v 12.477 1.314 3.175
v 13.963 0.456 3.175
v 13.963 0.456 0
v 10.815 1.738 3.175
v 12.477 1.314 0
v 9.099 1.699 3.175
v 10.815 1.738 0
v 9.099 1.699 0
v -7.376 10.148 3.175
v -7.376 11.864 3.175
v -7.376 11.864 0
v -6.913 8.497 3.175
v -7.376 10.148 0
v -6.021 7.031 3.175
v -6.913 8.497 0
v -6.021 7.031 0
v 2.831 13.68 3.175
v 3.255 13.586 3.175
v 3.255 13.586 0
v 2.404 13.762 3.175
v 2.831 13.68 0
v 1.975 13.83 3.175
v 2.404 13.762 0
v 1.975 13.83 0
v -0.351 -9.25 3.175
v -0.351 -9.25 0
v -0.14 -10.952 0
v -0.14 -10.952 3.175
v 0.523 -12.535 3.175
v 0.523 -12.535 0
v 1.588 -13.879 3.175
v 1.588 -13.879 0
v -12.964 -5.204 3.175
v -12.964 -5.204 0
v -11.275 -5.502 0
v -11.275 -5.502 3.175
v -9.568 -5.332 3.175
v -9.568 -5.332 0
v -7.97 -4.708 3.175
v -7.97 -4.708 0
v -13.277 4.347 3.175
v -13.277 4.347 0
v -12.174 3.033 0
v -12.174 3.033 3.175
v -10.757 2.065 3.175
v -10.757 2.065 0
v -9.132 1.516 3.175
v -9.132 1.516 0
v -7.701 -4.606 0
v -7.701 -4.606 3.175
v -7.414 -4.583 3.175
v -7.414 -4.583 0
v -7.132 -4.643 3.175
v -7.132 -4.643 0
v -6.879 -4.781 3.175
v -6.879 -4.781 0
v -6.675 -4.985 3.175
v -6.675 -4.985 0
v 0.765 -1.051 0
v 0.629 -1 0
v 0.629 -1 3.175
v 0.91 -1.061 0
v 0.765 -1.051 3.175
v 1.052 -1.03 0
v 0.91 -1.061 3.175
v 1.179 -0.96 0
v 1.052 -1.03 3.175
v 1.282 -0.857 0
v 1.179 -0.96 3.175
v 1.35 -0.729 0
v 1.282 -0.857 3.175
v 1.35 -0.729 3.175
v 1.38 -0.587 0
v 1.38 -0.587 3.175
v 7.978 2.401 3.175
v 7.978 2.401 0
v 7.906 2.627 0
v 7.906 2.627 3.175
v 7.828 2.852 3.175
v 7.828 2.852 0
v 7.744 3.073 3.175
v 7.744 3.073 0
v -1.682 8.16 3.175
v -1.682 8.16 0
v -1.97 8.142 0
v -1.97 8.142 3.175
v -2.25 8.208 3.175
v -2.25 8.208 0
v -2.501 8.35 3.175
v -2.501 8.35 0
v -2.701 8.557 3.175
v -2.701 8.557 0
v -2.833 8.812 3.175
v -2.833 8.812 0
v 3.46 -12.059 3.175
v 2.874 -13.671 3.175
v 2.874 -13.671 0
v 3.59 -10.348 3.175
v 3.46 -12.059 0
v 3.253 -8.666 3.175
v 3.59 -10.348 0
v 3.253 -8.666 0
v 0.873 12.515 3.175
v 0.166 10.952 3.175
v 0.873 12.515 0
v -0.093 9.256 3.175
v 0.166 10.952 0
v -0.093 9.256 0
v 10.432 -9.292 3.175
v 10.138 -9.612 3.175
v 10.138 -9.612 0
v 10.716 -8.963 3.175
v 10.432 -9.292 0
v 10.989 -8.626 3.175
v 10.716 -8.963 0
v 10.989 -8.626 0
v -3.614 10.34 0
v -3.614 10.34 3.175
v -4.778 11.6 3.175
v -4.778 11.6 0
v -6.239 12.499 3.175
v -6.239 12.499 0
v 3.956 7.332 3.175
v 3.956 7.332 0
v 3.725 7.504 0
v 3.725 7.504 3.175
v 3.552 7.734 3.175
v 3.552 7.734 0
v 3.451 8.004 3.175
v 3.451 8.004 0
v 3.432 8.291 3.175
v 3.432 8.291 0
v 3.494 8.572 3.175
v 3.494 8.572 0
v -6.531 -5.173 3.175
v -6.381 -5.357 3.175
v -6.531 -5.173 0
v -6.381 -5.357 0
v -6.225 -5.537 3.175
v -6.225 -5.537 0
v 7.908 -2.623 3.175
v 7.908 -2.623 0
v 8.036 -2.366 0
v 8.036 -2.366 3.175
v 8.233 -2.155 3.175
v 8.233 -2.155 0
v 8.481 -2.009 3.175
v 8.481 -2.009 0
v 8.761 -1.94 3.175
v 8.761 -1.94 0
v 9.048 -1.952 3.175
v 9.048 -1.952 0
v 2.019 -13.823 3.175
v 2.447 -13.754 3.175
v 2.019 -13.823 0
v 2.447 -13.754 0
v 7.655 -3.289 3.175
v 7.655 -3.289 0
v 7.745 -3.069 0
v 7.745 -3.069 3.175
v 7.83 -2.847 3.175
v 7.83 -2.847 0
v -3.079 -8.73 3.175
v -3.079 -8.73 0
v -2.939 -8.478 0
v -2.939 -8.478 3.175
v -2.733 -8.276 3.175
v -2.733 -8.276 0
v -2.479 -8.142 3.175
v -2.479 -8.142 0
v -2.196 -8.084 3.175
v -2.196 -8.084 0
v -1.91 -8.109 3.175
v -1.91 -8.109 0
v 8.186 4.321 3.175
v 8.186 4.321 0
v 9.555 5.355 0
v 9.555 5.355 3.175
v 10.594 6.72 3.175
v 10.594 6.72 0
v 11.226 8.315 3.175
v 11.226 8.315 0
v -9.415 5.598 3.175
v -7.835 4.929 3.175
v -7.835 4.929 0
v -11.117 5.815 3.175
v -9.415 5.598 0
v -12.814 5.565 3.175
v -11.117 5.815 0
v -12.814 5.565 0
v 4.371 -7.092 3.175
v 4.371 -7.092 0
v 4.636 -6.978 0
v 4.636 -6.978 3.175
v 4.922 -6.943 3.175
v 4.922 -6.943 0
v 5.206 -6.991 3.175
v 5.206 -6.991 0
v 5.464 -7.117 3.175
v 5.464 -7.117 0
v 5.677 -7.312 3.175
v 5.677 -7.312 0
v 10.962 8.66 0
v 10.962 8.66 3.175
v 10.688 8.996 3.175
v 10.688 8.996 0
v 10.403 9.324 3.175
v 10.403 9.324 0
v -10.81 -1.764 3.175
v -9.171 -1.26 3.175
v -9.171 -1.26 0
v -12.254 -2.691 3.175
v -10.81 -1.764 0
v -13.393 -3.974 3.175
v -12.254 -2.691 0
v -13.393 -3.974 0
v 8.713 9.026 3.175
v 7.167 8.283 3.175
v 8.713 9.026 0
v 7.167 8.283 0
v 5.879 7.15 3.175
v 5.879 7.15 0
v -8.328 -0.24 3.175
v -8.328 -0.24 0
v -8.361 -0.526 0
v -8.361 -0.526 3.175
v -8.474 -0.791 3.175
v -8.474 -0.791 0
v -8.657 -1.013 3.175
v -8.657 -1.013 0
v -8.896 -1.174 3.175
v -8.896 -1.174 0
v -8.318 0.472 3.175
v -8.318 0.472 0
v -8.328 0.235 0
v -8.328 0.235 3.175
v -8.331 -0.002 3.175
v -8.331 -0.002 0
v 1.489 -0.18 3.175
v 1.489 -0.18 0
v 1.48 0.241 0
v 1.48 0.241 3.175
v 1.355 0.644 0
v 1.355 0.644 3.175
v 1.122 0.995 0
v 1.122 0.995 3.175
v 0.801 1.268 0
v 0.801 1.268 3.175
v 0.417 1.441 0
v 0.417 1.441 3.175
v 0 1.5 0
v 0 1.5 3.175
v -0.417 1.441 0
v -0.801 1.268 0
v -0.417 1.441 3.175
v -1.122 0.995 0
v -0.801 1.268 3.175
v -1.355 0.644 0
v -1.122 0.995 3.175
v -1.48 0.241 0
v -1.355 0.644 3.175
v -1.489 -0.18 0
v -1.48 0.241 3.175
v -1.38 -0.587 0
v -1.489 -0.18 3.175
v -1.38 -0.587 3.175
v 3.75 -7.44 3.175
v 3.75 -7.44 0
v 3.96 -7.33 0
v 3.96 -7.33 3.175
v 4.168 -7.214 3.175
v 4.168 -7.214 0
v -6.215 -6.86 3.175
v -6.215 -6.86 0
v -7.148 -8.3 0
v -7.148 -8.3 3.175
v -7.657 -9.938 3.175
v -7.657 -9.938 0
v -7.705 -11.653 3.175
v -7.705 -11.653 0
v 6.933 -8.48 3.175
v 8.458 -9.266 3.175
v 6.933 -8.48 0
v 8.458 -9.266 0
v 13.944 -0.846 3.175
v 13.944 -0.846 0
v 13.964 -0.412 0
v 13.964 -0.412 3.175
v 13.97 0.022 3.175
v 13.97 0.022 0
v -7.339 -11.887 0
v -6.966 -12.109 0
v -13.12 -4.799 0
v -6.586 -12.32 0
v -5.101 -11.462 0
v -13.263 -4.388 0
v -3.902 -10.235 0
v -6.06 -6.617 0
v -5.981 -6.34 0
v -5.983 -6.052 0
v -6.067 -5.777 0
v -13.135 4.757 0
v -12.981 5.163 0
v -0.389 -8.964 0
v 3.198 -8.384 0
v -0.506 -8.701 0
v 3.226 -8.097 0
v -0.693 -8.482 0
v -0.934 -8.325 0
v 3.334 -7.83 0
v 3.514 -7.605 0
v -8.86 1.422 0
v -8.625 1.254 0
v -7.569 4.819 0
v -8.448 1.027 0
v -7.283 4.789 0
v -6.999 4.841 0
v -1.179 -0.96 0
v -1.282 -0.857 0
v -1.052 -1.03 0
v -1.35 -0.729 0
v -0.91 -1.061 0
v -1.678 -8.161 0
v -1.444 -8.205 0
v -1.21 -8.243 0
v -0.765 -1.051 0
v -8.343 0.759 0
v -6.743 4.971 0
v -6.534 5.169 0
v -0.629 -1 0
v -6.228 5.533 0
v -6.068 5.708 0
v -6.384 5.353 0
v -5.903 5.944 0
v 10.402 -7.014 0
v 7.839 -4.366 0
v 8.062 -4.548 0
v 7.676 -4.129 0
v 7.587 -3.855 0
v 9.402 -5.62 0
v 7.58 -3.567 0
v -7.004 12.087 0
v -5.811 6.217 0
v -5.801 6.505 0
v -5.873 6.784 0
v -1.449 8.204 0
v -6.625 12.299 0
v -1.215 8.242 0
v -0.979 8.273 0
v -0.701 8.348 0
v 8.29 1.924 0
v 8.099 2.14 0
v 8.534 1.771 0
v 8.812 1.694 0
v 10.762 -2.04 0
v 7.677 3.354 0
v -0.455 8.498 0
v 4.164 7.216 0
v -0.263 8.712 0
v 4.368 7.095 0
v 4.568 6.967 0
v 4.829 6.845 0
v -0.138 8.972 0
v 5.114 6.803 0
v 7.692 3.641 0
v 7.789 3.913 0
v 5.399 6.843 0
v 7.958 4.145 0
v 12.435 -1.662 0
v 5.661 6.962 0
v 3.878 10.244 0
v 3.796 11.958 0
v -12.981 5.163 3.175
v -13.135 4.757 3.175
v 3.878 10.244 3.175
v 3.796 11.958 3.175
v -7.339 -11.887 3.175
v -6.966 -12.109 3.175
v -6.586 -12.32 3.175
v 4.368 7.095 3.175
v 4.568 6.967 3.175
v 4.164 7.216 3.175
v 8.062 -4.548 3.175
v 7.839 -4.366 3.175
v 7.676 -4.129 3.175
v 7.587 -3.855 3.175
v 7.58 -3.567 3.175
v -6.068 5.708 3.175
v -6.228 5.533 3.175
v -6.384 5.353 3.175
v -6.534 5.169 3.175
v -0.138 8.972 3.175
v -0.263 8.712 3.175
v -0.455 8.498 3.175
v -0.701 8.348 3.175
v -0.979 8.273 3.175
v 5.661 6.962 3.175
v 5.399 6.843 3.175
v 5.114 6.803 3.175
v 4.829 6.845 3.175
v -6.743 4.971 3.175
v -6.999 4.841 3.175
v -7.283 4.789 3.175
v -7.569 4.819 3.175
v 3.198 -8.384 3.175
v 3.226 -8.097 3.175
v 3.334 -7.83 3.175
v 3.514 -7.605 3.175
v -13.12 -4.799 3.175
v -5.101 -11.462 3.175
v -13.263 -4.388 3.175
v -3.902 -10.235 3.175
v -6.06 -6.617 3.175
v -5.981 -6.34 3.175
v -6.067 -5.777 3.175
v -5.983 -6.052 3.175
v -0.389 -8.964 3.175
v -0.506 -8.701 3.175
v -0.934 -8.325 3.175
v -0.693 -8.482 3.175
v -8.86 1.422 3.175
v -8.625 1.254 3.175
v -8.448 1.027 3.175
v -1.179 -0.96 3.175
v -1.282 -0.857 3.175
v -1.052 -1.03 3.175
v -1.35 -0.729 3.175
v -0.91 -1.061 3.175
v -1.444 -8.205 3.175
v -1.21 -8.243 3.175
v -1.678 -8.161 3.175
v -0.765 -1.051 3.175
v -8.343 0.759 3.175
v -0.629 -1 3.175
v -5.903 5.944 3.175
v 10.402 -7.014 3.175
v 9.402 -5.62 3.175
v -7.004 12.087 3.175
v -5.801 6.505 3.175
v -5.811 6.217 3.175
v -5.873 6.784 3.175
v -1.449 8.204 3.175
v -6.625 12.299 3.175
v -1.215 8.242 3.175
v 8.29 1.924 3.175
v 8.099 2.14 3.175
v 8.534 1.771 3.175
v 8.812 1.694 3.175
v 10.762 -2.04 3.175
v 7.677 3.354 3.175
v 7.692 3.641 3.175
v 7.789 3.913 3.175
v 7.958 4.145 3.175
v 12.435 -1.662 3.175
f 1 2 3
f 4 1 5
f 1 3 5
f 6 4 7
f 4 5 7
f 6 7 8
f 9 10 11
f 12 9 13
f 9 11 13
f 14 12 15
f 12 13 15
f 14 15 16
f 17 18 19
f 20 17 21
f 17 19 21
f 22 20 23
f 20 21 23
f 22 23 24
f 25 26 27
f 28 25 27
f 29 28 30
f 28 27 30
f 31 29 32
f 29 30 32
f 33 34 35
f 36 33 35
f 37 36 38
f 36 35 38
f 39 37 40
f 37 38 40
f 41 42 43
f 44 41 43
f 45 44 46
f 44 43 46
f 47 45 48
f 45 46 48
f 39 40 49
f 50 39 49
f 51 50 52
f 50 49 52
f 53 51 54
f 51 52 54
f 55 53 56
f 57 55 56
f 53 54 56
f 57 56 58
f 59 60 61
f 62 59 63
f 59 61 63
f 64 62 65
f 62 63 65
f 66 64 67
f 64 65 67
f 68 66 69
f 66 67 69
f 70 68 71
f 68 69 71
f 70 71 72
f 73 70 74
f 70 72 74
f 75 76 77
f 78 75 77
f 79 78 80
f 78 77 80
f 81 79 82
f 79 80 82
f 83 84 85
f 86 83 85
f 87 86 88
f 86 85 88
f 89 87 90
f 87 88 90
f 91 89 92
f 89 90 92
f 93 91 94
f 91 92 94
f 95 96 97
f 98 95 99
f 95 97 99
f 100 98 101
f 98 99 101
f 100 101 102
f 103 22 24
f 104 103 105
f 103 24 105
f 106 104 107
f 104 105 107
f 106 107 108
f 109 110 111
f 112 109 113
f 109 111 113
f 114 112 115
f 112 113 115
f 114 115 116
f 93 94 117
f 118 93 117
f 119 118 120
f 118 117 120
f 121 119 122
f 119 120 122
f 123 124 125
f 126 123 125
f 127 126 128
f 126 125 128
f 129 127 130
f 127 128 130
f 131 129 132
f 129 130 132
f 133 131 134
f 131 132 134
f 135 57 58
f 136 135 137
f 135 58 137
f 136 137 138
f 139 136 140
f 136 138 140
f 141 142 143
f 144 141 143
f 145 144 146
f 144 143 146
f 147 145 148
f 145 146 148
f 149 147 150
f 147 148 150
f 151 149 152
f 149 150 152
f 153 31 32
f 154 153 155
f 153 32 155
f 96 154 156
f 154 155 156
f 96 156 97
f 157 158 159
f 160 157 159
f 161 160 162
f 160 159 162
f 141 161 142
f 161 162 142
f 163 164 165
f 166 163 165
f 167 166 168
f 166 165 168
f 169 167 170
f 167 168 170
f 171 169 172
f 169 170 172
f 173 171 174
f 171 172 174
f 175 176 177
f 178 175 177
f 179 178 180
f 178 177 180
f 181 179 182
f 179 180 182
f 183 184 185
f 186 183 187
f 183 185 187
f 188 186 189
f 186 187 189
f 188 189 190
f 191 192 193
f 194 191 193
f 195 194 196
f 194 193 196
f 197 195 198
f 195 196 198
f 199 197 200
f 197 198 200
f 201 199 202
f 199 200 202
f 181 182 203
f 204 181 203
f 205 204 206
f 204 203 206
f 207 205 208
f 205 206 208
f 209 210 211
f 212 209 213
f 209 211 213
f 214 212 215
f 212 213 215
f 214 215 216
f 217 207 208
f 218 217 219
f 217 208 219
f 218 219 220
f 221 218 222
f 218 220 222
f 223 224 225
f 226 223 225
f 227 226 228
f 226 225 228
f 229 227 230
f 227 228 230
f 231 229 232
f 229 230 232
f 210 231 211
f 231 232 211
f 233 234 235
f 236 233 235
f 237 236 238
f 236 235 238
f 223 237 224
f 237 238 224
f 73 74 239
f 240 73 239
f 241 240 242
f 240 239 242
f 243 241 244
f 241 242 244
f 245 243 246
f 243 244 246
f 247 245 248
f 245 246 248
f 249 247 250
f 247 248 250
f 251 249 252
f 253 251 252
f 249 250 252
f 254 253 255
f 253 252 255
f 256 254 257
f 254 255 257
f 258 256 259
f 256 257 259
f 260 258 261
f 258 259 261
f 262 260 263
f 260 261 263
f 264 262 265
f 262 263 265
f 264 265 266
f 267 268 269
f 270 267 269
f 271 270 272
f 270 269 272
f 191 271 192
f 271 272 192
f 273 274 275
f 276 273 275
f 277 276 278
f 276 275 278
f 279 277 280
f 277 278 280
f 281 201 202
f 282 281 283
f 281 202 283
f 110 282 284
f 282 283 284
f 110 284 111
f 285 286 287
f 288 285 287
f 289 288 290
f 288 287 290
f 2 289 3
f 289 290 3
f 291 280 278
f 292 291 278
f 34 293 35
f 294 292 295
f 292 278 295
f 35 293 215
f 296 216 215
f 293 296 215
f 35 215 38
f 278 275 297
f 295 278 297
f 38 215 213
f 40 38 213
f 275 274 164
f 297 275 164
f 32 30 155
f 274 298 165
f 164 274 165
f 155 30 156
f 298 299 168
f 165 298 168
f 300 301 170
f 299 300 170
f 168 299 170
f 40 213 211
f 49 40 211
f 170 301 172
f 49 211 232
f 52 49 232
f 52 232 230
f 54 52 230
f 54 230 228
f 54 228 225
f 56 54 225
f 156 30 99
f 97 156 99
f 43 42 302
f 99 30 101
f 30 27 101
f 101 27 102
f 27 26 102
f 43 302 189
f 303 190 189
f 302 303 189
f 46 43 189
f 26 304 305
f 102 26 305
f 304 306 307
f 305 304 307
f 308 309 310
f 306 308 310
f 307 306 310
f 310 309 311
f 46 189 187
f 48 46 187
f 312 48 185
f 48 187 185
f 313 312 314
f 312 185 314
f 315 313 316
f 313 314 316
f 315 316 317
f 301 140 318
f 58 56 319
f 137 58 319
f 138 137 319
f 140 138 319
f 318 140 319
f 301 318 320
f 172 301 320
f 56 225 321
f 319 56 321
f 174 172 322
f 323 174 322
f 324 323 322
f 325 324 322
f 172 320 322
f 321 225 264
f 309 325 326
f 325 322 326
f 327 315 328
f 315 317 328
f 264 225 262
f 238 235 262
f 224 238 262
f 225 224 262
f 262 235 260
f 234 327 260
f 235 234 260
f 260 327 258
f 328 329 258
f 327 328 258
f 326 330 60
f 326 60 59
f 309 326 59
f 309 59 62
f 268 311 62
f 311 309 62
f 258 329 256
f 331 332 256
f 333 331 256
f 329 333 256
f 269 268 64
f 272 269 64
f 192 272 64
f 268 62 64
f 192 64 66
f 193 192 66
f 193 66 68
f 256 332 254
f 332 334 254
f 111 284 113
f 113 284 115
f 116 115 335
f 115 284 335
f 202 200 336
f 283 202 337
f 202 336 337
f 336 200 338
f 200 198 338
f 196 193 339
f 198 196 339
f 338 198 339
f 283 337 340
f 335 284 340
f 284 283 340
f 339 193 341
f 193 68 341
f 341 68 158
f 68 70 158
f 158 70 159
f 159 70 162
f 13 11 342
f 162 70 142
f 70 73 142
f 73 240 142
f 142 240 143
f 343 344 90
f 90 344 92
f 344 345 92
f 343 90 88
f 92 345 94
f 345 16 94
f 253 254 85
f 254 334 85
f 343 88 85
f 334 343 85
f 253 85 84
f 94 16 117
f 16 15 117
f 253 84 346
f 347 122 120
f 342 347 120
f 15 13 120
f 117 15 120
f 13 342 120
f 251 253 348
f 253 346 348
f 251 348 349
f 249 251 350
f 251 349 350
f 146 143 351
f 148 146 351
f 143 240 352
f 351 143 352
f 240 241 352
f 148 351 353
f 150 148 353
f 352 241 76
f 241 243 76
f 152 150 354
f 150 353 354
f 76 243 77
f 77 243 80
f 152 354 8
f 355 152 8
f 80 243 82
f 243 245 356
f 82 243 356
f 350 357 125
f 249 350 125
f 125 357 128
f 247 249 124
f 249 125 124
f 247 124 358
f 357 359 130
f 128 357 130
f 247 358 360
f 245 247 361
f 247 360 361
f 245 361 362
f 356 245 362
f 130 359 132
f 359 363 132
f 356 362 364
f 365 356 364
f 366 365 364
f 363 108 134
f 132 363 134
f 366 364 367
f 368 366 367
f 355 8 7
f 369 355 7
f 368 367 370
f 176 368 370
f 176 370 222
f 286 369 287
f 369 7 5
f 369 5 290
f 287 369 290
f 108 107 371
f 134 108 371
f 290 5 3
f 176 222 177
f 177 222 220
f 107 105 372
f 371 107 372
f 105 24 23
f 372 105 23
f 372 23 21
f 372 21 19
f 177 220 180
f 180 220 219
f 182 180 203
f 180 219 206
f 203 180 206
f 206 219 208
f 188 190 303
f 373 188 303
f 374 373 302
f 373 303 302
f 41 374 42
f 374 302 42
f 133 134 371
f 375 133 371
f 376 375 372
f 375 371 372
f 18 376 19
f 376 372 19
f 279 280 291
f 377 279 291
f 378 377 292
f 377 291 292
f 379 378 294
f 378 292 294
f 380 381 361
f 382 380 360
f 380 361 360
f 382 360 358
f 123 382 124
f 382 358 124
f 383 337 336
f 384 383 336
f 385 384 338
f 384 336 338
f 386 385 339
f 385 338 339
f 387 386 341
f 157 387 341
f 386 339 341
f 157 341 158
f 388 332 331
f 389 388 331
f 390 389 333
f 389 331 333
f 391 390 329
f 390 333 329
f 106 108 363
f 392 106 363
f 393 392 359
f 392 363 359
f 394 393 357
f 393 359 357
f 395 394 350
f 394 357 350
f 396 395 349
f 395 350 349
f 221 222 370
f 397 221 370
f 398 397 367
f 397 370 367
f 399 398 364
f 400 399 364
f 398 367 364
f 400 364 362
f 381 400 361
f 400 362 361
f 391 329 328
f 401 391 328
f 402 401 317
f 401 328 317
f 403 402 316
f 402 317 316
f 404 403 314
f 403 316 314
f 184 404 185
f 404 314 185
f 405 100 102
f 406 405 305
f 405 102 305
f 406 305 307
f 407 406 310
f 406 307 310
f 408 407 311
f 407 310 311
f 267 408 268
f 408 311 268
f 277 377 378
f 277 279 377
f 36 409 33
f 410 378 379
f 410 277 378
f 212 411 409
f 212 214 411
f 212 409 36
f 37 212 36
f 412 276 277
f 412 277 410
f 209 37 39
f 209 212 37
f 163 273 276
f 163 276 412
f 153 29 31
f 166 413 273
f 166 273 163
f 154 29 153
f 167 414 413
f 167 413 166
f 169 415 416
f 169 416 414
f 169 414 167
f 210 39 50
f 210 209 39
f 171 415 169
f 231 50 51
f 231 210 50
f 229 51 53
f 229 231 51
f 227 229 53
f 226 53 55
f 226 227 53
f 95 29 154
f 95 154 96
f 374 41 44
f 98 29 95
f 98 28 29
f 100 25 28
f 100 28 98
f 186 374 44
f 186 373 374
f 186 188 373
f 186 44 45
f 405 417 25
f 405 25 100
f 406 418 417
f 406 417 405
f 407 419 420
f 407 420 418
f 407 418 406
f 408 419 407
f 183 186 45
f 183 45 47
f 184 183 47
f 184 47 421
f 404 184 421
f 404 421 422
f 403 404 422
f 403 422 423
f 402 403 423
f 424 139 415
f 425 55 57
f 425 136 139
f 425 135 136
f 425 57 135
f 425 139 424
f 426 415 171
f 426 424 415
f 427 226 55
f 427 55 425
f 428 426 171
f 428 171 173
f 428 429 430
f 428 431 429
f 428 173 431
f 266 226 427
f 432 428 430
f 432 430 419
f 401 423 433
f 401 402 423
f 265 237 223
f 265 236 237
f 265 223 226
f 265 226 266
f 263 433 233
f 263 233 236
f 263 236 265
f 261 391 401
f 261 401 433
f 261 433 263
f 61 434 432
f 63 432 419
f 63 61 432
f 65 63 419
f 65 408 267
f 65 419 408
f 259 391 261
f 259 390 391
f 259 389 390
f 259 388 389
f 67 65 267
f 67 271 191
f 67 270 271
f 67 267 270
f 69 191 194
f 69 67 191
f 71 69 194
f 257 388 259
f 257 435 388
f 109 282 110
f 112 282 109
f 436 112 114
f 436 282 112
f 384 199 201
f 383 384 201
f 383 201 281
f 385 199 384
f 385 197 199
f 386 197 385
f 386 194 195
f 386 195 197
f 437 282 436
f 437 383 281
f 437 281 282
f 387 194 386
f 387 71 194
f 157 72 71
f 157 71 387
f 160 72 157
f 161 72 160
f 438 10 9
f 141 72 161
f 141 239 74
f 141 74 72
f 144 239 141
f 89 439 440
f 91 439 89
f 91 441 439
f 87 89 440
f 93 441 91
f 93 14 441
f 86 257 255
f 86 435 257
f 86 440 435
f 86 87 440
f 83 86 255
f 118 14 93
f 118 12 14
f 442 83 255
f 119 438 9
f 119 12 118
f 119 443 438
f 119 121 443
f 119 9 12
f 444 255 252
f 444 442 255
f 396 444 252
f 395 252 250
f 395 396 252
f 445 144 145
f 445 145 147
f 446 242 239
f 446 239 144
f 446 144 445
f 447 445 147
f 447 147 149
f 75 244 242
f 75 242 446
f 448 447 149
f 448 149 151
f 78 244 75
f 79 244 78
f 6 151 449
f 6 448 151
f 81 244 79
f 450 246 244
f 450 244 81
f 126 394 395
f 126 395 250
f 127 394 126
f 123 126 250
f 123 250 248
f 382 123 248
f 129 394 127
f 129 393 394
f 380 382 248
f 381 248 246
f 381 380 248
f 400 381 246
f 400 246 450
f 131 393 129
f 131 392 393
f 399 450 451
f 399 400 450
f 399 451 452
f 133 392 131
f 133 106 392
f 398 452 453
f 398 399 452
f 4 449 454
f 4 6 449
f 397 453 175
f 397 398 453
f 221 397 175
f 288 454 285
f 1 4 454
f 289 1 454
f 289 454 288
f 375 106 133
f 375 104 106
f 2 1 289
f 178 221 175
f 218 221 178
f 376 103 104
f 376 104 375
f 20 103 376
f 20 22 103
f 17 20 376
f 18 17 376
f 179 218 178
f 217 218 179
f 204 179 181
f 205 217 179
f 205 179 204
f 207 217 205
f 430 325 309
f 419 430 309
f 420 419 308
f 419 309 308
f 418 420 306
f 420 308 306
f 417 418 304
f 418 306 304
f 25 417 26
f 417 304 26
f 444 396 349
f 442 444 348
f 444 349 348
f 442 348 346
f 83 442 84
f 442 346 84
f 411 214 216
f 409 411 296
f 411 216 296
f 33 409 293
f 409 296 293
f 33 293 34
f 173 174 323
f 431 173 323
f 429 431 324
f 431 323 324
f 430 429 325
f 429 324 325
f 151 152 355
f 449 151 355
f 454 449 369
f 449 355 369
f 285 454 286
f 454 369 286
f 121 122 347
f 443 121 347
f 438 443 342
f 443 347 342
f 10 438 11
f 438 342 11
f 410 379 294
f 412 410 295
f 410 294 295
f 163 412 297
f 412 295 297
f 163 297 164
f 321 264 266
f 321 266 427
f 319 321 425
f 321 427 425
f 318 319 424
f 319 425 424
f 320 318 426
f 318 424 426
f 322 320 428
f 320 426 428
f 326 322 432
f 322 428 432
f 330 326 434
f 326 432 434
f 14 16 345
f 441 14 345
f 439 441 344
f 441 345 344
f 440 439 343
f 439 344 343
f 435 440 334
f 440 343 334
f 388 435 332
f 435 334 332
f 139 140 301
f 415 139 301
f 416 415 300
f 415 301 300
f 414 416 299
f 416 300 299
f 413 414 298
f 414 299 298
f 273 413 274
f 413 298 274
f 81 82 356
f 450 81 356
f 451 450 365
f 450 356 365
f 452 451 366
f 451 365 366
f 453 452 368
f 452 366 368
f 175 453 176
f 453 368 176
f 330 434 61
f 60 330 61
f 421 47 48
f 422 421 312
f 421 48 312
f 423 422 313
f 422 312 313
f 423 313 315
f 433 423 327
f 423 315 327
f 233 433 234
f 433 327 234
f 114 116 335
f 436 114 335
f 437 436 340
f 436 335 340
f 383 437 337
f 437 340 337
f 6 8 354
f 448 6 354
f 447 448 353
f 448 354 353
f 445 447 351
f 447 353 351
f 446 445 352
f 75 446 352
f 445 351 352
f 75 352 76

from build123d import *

# Parameters (mm, degrees)
SKETCH3_R           = 13.97
GEARBODY_DEPTH      = 3.175
TOOTHCUT_DEPTH      = 4.175
CIRPATTERN1_COUNT   = 9
BOREDIA_R           = 1.499997014
BORE_DEPTH          = 12700
BOSS_EXTRUDE1_DEPTH = 3.175
SKETCH5_R           = 0.508
CUT_EXTRUDE1_DEPTH  = 4.175


with BuildPart() as part:
    # Sketch3 → gearBody (new body)
    with BuildSketch(Plane.XY):
        Circle(SKETCH3_R)
    extrude(amount=GEARBODY_DEPTH)

    # Sketch2 → toothCut (cut, through all)
    with BuildSketch(Plane.XY):
        with BuildLine():
            ThreePointArc((7.654596591, -3.288775527), (7.788168987, -2.958600559), (7.907507119, -2.623018223))
            ThreePointArc((7.907507119, -2.623018223), (8.3519289, -2.073263372), (9.048439358, -1.952373766))
            ThreePointArc((9.048439358, -1.952373766), (13.146424788, -1.34364254), (15.979509974, 1.679214819))
            ThreePointArc((15.979509974, 1.679214819), (15.020212204, -5.705937852), (10.834165744, -11.865300419))
            ThreePointArc((10.834165744, -11.865300419), (10.7226862, -7.723850118), (8.062481966, -4.547790968))
            ThreePointArc((8.062481966, -4.547790968), (7.621913496, -3.994943305), (7.654596591, -3.288775527))
        make_face()
    toothcut = extrude(amount=TOOTHCUT_DEPTH, mode=Mode.SUBTRACT)

    # CirPattern1: toothCut ×9 about axis
    cirpattern1_axis = Axis((0, 0, 0), (0, 0, 1))
    for i in range(1, CIRPATTERN1_COUNT):
        add(toothcut.rotate(cirpattern1_axis, i * 360 / CIRPATTERN1_COUNT), mode=Mode.SUBTRACT)

    # boreDia → bore (cut, symmetric)
    with BuildSketch(Plane.XY):
        Circle(BOREDIA_R)
    extrude(amount=BORE_DEPTH, both=True, mode=Mode.SUBTRACT)

    # Sketch4 → Boss-Extrude1 (add)
    with BuildSketch(Plane(origin=(0, 0, 0), x_dir=(-1, 0, 0), z_dir=(0, 0, -1))):
        with BuildLine():
            Line((1.118029954, -1.000000032), (-1.118029954, -1.000000032))
            ThreePointArc((-1.118029954, -1.000000032), (0, -1.499997014), (1.118029954, -1.000000032))
        make_face()
    extrude(amount=-BOSS_EXTRUDE1_DEPTH)

    # Sketch5 → Cut-Extrude1 (cut, through all)
    with BuildSketch(Plane.XY.offset(3.175)):
        with Locations((-0.873392334, -0.554784988)):
            Circle(SKETCH5_R)
        with Locations((0.873392334, -0.554784988)):
            Circle(SKETCH5_R)
    extrude(amount=-CUT_EXTRUDE1_DEPTH, mode=Mode.SUBTRACT)


solid = part.part
